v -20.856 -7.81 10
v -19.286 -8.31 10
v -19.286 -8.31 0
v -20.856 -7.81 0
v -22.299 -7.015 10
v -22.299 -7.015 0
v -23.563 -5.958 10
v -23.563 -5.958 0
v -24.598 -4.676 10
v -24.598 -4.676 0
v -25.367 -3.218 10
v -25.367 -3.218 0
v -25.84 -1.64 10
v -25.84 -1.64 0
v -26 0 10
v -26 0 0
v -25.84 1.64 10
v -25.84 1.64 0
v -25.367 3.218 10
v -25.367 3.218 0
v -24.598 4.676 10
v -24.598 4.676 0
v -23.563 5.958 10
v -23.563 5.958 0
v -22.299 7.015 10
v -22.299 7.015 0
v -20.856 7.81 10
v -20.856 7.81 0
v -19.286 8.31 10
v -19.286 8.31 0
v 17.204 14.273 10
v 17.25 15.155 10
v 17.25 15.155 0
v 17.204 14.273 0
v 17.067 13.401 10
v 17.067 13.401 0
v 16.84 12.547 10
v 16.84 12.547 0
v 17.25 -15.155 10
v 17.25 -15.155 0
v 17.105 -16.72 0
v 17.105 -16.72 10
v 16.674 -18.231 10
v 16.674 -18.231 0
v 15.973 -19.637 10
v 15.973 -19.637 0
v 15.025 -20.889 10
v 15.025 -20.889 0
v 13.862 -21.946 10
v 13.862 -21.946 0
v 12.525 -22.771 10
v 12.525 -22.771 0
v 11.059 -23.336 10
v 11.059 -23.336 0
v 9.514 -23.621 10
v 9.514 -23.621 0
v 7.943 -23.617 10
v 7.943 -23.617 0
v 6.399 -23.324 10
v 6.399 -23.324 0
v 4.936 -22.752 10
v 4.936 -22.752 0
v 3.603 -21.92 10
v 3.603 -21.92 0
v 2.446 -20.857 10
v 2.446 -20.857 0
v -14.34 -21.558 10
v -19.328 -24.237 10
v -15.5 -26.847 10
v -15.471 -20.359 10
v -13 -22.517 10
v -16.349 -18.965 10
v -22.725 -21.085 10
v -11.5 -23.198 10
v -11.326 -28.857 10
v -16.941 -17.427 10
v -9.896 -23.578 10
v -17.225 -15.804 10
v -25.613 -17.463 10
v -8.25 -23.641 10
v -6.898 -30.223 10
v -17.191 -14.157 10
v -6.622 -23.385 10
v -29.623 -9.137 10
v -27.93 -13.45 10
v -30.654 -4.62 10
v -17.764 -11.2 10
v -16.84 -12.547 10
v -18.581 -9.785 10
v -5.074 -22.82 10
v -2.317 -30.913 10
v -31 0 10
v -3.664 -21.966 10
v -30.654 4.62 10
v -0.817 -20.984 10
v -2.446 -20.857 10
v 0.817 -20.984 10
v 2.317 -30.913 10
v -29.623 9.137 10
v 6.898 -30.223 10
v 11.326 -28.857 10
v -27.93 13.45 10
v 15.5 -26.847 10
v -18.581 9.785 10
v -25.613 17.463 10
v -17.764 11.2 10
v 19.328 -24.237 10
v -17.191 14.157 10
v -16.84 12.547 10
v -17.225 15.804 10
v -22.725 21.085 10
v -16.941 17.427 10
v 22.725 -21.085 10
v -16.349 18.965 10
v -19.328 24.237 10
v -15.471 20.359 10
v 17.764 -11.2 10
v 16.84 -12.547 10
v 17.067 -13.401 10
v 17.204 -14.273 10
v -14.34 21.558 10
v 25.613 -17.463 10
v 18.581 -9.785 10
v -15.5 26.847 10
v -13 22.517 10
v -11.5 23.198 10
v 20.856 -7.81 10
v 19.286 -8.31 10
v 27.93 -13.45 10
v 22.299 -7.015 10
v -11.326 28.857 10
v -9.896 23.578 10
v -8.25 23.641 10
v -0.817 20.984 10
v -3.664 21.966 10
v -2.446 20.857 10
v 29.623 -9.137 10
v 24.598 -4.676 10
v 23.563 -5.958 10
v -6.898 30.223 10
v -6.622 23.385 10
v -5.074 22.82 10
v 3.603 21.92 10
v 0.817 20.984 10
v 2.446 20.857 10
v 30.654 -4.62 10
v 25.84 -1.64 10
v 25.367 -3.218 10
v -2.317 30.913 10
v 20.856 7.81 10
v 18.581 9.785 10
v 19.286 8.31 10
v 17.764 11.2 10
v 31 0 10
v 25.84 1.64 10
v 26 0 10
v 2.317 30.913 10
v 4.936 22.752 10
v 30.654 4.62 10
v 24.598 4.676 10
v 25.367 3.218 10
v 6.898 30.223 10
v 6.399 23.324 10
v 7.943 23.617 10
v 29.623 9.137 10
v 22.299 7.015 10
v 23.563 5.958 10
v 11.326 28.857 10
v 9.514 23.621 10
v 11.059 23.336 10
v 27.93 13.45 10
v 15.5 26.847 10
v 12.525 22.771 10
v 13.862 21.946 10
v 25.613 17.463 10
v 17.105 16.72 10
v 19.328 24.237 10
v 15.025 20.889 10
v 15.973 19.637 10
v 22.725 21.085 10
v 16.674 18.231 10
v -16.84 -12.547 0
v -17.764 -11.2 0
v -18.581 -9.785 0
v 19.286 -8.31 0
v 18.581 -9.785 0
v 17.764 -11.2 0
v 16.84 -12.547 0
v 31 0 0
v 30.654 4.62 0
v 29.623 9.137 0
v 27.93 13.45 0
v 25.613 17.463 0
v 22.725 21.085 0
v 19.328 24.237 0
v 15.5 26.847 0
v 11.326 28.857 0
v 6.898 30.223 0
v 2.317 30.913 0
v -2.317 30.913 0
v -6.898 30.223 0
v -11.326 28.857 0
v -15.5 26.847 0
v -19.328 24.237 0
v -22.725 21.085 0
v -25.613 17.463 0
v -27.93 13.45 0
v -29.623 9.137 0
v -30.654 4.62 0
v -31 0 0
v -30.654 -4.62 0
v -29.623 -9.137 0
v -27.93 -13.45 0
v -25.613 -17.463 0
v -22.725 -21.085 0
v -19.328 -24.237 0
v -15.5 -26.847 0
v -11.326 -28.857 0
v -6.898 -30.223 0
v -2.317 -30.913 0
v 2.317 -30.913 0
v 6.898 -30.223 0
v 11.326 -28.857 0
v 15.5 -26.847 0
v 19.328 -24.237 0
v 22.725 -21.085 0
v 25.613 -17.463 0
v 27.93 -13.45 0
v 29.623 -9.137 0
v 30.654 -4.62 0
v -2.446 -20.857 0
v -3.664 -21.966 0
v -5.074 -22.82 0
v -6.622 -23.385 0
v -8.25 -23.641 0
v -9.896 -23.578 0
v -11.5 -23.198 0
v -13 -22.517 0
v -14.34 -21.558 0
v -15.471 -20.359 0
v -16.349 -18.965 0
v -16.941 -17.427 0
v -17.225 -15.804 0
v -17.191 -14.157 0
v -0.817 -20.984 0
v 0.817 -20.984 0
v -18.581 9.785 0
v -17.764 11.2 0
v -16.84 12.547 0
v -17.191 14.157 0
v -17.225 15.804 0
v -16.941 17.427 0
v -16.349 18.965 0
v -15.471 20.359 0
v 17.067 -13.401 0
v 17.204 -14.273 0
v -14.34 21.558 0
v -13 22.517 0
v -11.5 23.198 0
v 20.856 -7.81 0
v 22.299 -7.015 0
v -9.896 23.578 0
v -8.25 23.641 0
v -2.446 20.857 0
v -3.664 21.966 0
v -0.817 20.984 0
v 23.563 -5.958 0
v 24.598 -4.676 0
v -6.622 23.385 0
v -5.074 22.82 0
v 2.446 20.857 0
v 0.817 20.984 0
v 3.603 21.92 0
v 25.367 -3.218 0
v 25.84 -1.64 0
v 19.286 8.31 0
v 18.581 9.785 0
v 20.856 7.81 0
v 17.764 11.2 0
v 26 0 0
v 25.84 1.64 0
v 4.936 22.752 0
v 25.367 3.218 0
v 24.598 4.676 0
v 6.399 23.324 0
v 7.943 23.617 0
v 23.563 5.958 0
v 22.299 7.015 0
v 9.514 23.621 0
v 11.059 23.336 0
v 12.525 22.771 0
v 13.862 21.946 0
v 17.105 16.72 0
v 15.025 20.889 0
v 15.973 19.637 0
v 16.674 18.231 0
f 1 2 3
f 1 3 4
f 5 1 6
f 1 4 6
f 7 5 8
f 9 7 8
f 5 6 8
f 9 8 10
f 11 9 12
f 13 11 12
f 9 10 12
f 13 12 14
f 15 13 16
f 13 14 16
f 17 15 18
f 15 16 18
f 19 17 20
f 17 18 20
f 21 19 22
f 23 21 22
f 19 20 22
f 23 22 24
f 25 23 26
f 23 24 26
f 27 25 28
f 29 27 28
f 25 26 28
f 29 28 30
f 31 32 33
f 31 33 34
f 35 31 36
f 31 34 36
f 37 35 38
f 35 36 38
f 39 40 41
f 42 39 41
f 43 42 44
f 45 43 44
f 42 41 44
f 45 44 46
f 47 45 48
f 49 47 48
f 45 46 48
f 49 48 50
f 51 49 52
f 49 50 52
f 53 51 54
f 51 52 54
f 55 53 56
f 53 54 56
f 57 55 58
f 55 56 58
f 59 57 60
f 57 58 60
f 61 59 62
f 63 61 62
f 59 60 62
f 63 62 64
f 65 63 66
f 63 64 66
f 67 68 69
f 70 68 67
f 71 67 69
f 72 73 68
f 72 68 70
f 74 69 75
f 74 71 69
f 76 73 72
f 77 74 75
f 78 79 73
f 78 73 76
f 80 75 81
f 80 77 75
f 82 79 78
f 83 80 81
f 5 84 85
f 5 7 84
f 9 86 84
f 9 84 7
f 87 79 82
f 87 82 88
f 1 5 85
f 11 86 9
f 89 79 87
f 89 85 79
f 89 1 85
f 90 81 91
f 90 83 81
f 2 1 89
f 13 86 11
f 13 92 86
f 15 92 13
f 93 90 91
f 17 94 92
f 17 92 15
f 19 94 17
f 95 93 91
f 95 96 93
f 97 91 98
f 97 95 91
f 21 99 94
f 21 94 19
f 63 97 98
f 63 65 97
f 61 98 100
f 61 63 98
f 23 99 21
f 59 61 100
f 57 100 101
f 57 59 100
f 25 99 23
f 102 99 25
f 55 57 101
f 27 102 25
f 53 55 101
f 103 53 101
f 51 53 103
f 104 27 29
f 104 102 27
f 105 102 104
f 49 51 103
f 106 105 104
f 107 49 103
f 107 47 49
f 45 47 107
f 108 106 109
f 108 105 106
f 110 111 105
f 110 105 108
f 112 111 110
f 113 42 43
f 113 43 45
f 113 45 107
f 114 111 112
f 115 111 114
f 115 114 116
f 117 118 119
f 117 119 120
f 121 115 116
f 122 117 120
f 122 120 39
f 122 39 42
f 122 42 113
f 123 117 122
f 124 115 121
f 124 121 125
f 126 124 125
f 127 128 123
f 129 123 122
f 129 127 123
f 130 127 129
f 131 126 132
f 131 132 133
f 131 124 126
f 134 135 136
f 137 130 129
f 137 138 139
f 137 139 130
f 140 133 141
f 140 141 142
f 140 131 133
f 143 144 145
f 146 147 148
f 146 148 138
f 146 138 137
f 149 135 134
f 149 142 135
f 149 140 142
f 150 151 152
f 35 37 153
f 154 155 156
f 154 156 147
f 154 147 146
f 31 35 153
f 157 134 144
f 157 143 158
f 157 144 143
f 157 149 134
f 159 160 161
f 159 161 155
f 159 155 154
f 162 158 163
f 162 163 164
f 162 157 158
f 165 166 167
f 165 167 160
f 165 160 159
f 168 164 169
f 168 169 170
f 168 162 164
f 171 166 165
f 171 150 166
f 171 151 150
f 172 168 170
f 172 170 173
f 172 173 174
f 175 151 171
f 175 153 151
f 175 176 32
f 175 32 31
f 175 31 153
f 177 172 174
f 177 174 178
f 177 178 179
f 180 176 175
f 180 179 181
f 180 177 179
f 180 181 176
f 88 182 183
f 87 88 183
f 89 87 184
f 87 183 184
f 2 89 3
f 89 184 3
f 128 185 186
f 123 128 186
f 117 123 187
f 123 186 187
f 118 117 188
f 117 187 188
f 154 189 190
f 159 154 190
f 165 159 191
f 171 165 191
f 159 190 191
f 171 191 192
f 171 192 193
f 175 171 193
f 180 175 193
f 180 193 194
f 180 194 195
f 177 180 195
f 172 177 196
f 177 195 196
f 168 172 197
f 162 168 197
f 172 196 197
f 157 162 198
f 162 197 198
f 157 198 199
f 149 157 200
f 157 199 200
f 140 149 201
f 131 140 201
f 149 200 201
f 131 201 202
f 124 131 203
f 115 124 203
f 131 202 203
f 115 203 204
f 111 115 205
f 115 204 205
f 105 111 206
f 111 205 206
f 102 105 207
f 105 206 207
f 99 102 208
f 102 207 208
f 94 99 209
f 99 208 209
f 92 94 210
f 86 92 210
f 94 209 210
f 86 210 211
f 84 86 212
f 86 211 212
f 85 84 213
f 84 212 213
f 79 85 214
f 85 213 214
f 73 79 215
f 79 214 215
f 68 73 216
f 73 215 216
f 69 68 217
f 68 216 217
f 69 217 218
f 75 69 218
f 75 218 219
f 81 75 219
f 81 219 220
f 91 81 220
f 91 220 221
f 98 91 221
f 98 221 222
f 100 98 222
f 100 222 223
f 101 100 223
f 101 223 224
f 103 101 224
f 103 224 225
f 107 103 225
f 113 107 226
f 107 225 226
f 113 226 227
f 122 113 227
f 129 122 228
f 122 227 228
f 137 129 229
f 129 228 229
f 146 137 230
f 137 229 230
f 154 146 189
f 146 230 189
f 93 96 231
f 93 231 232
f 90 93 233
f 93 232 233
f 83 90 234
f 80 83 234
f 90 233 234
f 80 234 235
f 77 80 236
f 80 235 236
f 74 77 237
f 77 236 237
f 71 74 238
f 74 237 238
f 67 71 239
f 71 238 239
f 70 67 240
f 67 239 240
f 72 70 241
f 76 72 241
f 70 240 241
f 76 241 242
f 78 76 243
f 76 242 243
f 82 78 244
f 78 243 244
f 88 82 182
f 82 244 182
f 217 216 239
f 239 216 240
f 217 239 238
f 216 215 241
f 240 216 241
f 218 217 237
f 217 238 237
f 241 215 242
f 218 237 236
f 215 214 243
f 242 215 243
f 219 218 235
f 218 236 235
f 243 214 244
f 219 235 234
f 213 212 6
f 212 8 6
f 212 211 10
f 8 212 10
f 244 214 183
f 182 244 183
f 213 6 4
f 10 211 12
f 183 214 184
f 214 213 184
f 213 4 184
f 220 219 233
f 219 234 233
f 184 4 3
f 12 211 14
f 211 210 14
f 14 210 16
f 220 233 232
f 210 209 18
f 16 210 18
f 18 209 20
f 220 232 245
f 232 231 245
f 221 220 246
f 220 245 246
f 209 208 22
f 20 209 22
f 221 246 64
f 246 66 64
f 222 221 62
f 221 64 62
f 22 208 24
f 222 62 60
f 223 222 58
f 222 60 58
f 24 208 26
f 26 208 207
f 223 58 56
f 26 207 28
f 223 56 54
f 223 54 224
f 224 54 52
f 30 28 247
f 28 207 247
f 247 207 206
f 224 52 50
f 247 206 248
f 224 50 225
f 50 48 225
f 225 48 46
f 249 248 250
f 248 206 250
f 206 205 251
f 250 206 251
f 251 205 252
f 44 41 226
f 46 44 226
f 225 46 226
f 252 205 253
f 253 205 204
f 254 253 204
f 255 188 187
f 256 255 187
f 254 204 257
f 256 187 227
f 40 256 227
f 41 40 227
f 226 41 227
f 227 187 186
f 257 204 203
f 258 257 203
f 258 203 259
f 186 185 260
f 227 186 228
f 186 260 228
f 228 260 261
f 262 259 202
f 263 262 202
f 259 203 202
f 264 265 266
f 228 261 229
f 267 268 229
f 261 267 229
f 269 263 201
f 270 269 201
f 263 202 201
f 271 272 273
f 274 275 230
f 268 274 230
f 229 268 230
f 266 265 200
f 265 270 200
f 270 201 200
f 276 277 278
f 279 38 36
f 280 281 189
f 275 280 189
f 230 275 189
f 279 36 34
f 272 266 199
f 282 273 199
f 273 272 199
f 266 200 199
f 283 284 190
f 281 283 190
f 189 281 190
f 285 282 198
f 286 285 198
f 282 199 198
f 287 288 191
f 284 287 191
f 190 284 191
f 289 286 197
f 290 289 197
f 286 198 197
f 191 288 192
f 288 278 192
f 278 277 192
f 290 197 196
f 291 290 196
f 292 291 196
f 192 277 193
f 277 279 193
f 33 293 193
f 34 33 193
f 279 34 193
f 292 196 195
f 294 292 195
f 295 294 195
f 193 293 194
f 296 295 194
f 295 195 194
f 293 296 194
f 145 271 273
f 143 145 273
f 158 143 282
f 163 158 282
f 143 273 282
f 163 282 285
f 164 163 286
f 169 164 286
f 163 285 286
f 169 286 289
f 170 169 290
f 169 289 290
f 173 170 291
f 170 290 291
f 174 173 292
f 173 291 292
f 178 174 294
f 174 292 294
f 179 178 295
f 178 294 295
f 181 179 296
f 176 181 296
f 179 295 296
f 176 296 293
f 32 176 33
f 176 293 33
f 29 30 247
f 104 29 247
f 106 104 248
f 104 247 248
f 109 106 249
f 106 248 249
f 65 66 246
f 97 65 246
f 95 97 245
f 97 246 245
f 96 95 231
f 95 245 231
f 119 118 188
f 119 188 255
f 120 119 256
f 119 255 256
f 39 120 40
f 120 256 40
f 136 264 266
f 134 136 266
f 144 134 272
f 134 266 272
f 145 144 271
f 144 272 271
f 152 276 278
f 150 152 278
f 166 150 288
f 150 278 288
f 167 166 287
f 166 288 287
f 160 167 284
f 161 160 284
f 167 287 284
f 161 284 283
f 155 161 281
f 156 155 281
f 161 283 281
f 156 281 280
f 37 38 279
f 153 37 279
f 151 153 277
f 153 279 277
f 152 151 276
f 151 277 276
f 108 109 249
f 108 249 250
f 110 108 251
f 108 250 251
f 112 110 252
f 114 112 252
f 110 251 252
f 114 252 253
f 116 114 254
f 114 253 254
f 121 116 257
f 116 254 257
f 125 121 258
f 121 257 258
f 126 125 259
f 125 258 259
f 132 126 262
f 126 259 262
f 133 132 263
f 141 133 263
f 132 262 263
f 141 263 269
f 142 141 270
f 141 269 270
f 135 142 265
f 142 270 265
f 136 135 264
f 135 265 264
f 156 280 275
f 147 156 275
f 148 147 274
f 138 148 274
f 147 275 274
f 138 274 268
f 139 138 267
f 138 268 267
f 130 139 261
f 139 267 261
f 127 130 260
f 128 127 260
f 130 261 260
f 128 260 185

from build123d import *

# Parameters (mm, degrees)
F0_R     = 31
F1_DEPTH = 10


# Not quite as in the source:
# - a feature names something its author has since deleted; it is built from what else it names


with BuildPart() as f1:
    # F0 (on Top) → F1 (new body)
    with BuildSketch(Plane.XY):
        Circle(F0_R)
        with BuildLine():
            ThreePointArc((19.2857142857, 8.310308327), (24.1116779802, 5.3418830281), (26, 0))
            ThreePointArc((26, 0), (24.1116779802, -5.3418830281), (19.2857142857, -8.310308327))
            ThreePointArc((19.2857142857, -8.310308327), (18.1865334795, -10.5), (16.8397952673, -12.5467643381))
            ThreePointArc((16.8397952673, -12.5467643381), (17.1468226066, -13.83507715), (17.25, -15.1554445662))
            ThreePointArc((17.25, -15.1554445662), (11.8049395785, -23.0874899627), (2.4459190184, -20.8570726651))
            ThreePointArc((2.4459190184, -20.8570726651), (0, -21), (-2.4459190184, -20.8570726651))
            ThreePointArc((-2.4459190184, -20.8570726651), (-13, -22.5166604984), (-16.8397952673, -12.5467643381))
            ThreePointArc((-16.8397952673, -12.5467643381), (-18.1865334795, -10.5), (-19.2857142857, -8.310308327))
            ThreePointArc((-19.2857142857, -8.310308327), (-26, 0), (-19.2857142857, 8.310308327))
            ThreePointArc((-19.2857142857, 8.310308327), (-18.1865334795, 10.5), (-16.8397952673, 12.5467643381))
            ThreePointArc((-16.8397952673, 12.5467643381), (-13, 22.5166604984), (-2.4459190184, 20.8570726651))
            ThreePointArc((-2.4459190184, 20.8570726651), (0, 21), (2.4459190184, 20.8570726651))
            ThreePointArc((2.4459190184, 20.8570726651), (11.8049395785, 23.0874899627), (17.25, 15.1554445662))
            ThreePointArc((17.25, 15.1554445662), (17.1468226066, 13.83507715), (16.8397952673, 12.5467643381))
            ThreePointArc((16.8397952673, 12.5467643381), (18.1865334795, 10.5), (19.2857142857, 8.310308327))
        make_face(mode=Mode.SUBTRACT)
    extrude(amount=F1_DEPTH)


solid = f1.part
